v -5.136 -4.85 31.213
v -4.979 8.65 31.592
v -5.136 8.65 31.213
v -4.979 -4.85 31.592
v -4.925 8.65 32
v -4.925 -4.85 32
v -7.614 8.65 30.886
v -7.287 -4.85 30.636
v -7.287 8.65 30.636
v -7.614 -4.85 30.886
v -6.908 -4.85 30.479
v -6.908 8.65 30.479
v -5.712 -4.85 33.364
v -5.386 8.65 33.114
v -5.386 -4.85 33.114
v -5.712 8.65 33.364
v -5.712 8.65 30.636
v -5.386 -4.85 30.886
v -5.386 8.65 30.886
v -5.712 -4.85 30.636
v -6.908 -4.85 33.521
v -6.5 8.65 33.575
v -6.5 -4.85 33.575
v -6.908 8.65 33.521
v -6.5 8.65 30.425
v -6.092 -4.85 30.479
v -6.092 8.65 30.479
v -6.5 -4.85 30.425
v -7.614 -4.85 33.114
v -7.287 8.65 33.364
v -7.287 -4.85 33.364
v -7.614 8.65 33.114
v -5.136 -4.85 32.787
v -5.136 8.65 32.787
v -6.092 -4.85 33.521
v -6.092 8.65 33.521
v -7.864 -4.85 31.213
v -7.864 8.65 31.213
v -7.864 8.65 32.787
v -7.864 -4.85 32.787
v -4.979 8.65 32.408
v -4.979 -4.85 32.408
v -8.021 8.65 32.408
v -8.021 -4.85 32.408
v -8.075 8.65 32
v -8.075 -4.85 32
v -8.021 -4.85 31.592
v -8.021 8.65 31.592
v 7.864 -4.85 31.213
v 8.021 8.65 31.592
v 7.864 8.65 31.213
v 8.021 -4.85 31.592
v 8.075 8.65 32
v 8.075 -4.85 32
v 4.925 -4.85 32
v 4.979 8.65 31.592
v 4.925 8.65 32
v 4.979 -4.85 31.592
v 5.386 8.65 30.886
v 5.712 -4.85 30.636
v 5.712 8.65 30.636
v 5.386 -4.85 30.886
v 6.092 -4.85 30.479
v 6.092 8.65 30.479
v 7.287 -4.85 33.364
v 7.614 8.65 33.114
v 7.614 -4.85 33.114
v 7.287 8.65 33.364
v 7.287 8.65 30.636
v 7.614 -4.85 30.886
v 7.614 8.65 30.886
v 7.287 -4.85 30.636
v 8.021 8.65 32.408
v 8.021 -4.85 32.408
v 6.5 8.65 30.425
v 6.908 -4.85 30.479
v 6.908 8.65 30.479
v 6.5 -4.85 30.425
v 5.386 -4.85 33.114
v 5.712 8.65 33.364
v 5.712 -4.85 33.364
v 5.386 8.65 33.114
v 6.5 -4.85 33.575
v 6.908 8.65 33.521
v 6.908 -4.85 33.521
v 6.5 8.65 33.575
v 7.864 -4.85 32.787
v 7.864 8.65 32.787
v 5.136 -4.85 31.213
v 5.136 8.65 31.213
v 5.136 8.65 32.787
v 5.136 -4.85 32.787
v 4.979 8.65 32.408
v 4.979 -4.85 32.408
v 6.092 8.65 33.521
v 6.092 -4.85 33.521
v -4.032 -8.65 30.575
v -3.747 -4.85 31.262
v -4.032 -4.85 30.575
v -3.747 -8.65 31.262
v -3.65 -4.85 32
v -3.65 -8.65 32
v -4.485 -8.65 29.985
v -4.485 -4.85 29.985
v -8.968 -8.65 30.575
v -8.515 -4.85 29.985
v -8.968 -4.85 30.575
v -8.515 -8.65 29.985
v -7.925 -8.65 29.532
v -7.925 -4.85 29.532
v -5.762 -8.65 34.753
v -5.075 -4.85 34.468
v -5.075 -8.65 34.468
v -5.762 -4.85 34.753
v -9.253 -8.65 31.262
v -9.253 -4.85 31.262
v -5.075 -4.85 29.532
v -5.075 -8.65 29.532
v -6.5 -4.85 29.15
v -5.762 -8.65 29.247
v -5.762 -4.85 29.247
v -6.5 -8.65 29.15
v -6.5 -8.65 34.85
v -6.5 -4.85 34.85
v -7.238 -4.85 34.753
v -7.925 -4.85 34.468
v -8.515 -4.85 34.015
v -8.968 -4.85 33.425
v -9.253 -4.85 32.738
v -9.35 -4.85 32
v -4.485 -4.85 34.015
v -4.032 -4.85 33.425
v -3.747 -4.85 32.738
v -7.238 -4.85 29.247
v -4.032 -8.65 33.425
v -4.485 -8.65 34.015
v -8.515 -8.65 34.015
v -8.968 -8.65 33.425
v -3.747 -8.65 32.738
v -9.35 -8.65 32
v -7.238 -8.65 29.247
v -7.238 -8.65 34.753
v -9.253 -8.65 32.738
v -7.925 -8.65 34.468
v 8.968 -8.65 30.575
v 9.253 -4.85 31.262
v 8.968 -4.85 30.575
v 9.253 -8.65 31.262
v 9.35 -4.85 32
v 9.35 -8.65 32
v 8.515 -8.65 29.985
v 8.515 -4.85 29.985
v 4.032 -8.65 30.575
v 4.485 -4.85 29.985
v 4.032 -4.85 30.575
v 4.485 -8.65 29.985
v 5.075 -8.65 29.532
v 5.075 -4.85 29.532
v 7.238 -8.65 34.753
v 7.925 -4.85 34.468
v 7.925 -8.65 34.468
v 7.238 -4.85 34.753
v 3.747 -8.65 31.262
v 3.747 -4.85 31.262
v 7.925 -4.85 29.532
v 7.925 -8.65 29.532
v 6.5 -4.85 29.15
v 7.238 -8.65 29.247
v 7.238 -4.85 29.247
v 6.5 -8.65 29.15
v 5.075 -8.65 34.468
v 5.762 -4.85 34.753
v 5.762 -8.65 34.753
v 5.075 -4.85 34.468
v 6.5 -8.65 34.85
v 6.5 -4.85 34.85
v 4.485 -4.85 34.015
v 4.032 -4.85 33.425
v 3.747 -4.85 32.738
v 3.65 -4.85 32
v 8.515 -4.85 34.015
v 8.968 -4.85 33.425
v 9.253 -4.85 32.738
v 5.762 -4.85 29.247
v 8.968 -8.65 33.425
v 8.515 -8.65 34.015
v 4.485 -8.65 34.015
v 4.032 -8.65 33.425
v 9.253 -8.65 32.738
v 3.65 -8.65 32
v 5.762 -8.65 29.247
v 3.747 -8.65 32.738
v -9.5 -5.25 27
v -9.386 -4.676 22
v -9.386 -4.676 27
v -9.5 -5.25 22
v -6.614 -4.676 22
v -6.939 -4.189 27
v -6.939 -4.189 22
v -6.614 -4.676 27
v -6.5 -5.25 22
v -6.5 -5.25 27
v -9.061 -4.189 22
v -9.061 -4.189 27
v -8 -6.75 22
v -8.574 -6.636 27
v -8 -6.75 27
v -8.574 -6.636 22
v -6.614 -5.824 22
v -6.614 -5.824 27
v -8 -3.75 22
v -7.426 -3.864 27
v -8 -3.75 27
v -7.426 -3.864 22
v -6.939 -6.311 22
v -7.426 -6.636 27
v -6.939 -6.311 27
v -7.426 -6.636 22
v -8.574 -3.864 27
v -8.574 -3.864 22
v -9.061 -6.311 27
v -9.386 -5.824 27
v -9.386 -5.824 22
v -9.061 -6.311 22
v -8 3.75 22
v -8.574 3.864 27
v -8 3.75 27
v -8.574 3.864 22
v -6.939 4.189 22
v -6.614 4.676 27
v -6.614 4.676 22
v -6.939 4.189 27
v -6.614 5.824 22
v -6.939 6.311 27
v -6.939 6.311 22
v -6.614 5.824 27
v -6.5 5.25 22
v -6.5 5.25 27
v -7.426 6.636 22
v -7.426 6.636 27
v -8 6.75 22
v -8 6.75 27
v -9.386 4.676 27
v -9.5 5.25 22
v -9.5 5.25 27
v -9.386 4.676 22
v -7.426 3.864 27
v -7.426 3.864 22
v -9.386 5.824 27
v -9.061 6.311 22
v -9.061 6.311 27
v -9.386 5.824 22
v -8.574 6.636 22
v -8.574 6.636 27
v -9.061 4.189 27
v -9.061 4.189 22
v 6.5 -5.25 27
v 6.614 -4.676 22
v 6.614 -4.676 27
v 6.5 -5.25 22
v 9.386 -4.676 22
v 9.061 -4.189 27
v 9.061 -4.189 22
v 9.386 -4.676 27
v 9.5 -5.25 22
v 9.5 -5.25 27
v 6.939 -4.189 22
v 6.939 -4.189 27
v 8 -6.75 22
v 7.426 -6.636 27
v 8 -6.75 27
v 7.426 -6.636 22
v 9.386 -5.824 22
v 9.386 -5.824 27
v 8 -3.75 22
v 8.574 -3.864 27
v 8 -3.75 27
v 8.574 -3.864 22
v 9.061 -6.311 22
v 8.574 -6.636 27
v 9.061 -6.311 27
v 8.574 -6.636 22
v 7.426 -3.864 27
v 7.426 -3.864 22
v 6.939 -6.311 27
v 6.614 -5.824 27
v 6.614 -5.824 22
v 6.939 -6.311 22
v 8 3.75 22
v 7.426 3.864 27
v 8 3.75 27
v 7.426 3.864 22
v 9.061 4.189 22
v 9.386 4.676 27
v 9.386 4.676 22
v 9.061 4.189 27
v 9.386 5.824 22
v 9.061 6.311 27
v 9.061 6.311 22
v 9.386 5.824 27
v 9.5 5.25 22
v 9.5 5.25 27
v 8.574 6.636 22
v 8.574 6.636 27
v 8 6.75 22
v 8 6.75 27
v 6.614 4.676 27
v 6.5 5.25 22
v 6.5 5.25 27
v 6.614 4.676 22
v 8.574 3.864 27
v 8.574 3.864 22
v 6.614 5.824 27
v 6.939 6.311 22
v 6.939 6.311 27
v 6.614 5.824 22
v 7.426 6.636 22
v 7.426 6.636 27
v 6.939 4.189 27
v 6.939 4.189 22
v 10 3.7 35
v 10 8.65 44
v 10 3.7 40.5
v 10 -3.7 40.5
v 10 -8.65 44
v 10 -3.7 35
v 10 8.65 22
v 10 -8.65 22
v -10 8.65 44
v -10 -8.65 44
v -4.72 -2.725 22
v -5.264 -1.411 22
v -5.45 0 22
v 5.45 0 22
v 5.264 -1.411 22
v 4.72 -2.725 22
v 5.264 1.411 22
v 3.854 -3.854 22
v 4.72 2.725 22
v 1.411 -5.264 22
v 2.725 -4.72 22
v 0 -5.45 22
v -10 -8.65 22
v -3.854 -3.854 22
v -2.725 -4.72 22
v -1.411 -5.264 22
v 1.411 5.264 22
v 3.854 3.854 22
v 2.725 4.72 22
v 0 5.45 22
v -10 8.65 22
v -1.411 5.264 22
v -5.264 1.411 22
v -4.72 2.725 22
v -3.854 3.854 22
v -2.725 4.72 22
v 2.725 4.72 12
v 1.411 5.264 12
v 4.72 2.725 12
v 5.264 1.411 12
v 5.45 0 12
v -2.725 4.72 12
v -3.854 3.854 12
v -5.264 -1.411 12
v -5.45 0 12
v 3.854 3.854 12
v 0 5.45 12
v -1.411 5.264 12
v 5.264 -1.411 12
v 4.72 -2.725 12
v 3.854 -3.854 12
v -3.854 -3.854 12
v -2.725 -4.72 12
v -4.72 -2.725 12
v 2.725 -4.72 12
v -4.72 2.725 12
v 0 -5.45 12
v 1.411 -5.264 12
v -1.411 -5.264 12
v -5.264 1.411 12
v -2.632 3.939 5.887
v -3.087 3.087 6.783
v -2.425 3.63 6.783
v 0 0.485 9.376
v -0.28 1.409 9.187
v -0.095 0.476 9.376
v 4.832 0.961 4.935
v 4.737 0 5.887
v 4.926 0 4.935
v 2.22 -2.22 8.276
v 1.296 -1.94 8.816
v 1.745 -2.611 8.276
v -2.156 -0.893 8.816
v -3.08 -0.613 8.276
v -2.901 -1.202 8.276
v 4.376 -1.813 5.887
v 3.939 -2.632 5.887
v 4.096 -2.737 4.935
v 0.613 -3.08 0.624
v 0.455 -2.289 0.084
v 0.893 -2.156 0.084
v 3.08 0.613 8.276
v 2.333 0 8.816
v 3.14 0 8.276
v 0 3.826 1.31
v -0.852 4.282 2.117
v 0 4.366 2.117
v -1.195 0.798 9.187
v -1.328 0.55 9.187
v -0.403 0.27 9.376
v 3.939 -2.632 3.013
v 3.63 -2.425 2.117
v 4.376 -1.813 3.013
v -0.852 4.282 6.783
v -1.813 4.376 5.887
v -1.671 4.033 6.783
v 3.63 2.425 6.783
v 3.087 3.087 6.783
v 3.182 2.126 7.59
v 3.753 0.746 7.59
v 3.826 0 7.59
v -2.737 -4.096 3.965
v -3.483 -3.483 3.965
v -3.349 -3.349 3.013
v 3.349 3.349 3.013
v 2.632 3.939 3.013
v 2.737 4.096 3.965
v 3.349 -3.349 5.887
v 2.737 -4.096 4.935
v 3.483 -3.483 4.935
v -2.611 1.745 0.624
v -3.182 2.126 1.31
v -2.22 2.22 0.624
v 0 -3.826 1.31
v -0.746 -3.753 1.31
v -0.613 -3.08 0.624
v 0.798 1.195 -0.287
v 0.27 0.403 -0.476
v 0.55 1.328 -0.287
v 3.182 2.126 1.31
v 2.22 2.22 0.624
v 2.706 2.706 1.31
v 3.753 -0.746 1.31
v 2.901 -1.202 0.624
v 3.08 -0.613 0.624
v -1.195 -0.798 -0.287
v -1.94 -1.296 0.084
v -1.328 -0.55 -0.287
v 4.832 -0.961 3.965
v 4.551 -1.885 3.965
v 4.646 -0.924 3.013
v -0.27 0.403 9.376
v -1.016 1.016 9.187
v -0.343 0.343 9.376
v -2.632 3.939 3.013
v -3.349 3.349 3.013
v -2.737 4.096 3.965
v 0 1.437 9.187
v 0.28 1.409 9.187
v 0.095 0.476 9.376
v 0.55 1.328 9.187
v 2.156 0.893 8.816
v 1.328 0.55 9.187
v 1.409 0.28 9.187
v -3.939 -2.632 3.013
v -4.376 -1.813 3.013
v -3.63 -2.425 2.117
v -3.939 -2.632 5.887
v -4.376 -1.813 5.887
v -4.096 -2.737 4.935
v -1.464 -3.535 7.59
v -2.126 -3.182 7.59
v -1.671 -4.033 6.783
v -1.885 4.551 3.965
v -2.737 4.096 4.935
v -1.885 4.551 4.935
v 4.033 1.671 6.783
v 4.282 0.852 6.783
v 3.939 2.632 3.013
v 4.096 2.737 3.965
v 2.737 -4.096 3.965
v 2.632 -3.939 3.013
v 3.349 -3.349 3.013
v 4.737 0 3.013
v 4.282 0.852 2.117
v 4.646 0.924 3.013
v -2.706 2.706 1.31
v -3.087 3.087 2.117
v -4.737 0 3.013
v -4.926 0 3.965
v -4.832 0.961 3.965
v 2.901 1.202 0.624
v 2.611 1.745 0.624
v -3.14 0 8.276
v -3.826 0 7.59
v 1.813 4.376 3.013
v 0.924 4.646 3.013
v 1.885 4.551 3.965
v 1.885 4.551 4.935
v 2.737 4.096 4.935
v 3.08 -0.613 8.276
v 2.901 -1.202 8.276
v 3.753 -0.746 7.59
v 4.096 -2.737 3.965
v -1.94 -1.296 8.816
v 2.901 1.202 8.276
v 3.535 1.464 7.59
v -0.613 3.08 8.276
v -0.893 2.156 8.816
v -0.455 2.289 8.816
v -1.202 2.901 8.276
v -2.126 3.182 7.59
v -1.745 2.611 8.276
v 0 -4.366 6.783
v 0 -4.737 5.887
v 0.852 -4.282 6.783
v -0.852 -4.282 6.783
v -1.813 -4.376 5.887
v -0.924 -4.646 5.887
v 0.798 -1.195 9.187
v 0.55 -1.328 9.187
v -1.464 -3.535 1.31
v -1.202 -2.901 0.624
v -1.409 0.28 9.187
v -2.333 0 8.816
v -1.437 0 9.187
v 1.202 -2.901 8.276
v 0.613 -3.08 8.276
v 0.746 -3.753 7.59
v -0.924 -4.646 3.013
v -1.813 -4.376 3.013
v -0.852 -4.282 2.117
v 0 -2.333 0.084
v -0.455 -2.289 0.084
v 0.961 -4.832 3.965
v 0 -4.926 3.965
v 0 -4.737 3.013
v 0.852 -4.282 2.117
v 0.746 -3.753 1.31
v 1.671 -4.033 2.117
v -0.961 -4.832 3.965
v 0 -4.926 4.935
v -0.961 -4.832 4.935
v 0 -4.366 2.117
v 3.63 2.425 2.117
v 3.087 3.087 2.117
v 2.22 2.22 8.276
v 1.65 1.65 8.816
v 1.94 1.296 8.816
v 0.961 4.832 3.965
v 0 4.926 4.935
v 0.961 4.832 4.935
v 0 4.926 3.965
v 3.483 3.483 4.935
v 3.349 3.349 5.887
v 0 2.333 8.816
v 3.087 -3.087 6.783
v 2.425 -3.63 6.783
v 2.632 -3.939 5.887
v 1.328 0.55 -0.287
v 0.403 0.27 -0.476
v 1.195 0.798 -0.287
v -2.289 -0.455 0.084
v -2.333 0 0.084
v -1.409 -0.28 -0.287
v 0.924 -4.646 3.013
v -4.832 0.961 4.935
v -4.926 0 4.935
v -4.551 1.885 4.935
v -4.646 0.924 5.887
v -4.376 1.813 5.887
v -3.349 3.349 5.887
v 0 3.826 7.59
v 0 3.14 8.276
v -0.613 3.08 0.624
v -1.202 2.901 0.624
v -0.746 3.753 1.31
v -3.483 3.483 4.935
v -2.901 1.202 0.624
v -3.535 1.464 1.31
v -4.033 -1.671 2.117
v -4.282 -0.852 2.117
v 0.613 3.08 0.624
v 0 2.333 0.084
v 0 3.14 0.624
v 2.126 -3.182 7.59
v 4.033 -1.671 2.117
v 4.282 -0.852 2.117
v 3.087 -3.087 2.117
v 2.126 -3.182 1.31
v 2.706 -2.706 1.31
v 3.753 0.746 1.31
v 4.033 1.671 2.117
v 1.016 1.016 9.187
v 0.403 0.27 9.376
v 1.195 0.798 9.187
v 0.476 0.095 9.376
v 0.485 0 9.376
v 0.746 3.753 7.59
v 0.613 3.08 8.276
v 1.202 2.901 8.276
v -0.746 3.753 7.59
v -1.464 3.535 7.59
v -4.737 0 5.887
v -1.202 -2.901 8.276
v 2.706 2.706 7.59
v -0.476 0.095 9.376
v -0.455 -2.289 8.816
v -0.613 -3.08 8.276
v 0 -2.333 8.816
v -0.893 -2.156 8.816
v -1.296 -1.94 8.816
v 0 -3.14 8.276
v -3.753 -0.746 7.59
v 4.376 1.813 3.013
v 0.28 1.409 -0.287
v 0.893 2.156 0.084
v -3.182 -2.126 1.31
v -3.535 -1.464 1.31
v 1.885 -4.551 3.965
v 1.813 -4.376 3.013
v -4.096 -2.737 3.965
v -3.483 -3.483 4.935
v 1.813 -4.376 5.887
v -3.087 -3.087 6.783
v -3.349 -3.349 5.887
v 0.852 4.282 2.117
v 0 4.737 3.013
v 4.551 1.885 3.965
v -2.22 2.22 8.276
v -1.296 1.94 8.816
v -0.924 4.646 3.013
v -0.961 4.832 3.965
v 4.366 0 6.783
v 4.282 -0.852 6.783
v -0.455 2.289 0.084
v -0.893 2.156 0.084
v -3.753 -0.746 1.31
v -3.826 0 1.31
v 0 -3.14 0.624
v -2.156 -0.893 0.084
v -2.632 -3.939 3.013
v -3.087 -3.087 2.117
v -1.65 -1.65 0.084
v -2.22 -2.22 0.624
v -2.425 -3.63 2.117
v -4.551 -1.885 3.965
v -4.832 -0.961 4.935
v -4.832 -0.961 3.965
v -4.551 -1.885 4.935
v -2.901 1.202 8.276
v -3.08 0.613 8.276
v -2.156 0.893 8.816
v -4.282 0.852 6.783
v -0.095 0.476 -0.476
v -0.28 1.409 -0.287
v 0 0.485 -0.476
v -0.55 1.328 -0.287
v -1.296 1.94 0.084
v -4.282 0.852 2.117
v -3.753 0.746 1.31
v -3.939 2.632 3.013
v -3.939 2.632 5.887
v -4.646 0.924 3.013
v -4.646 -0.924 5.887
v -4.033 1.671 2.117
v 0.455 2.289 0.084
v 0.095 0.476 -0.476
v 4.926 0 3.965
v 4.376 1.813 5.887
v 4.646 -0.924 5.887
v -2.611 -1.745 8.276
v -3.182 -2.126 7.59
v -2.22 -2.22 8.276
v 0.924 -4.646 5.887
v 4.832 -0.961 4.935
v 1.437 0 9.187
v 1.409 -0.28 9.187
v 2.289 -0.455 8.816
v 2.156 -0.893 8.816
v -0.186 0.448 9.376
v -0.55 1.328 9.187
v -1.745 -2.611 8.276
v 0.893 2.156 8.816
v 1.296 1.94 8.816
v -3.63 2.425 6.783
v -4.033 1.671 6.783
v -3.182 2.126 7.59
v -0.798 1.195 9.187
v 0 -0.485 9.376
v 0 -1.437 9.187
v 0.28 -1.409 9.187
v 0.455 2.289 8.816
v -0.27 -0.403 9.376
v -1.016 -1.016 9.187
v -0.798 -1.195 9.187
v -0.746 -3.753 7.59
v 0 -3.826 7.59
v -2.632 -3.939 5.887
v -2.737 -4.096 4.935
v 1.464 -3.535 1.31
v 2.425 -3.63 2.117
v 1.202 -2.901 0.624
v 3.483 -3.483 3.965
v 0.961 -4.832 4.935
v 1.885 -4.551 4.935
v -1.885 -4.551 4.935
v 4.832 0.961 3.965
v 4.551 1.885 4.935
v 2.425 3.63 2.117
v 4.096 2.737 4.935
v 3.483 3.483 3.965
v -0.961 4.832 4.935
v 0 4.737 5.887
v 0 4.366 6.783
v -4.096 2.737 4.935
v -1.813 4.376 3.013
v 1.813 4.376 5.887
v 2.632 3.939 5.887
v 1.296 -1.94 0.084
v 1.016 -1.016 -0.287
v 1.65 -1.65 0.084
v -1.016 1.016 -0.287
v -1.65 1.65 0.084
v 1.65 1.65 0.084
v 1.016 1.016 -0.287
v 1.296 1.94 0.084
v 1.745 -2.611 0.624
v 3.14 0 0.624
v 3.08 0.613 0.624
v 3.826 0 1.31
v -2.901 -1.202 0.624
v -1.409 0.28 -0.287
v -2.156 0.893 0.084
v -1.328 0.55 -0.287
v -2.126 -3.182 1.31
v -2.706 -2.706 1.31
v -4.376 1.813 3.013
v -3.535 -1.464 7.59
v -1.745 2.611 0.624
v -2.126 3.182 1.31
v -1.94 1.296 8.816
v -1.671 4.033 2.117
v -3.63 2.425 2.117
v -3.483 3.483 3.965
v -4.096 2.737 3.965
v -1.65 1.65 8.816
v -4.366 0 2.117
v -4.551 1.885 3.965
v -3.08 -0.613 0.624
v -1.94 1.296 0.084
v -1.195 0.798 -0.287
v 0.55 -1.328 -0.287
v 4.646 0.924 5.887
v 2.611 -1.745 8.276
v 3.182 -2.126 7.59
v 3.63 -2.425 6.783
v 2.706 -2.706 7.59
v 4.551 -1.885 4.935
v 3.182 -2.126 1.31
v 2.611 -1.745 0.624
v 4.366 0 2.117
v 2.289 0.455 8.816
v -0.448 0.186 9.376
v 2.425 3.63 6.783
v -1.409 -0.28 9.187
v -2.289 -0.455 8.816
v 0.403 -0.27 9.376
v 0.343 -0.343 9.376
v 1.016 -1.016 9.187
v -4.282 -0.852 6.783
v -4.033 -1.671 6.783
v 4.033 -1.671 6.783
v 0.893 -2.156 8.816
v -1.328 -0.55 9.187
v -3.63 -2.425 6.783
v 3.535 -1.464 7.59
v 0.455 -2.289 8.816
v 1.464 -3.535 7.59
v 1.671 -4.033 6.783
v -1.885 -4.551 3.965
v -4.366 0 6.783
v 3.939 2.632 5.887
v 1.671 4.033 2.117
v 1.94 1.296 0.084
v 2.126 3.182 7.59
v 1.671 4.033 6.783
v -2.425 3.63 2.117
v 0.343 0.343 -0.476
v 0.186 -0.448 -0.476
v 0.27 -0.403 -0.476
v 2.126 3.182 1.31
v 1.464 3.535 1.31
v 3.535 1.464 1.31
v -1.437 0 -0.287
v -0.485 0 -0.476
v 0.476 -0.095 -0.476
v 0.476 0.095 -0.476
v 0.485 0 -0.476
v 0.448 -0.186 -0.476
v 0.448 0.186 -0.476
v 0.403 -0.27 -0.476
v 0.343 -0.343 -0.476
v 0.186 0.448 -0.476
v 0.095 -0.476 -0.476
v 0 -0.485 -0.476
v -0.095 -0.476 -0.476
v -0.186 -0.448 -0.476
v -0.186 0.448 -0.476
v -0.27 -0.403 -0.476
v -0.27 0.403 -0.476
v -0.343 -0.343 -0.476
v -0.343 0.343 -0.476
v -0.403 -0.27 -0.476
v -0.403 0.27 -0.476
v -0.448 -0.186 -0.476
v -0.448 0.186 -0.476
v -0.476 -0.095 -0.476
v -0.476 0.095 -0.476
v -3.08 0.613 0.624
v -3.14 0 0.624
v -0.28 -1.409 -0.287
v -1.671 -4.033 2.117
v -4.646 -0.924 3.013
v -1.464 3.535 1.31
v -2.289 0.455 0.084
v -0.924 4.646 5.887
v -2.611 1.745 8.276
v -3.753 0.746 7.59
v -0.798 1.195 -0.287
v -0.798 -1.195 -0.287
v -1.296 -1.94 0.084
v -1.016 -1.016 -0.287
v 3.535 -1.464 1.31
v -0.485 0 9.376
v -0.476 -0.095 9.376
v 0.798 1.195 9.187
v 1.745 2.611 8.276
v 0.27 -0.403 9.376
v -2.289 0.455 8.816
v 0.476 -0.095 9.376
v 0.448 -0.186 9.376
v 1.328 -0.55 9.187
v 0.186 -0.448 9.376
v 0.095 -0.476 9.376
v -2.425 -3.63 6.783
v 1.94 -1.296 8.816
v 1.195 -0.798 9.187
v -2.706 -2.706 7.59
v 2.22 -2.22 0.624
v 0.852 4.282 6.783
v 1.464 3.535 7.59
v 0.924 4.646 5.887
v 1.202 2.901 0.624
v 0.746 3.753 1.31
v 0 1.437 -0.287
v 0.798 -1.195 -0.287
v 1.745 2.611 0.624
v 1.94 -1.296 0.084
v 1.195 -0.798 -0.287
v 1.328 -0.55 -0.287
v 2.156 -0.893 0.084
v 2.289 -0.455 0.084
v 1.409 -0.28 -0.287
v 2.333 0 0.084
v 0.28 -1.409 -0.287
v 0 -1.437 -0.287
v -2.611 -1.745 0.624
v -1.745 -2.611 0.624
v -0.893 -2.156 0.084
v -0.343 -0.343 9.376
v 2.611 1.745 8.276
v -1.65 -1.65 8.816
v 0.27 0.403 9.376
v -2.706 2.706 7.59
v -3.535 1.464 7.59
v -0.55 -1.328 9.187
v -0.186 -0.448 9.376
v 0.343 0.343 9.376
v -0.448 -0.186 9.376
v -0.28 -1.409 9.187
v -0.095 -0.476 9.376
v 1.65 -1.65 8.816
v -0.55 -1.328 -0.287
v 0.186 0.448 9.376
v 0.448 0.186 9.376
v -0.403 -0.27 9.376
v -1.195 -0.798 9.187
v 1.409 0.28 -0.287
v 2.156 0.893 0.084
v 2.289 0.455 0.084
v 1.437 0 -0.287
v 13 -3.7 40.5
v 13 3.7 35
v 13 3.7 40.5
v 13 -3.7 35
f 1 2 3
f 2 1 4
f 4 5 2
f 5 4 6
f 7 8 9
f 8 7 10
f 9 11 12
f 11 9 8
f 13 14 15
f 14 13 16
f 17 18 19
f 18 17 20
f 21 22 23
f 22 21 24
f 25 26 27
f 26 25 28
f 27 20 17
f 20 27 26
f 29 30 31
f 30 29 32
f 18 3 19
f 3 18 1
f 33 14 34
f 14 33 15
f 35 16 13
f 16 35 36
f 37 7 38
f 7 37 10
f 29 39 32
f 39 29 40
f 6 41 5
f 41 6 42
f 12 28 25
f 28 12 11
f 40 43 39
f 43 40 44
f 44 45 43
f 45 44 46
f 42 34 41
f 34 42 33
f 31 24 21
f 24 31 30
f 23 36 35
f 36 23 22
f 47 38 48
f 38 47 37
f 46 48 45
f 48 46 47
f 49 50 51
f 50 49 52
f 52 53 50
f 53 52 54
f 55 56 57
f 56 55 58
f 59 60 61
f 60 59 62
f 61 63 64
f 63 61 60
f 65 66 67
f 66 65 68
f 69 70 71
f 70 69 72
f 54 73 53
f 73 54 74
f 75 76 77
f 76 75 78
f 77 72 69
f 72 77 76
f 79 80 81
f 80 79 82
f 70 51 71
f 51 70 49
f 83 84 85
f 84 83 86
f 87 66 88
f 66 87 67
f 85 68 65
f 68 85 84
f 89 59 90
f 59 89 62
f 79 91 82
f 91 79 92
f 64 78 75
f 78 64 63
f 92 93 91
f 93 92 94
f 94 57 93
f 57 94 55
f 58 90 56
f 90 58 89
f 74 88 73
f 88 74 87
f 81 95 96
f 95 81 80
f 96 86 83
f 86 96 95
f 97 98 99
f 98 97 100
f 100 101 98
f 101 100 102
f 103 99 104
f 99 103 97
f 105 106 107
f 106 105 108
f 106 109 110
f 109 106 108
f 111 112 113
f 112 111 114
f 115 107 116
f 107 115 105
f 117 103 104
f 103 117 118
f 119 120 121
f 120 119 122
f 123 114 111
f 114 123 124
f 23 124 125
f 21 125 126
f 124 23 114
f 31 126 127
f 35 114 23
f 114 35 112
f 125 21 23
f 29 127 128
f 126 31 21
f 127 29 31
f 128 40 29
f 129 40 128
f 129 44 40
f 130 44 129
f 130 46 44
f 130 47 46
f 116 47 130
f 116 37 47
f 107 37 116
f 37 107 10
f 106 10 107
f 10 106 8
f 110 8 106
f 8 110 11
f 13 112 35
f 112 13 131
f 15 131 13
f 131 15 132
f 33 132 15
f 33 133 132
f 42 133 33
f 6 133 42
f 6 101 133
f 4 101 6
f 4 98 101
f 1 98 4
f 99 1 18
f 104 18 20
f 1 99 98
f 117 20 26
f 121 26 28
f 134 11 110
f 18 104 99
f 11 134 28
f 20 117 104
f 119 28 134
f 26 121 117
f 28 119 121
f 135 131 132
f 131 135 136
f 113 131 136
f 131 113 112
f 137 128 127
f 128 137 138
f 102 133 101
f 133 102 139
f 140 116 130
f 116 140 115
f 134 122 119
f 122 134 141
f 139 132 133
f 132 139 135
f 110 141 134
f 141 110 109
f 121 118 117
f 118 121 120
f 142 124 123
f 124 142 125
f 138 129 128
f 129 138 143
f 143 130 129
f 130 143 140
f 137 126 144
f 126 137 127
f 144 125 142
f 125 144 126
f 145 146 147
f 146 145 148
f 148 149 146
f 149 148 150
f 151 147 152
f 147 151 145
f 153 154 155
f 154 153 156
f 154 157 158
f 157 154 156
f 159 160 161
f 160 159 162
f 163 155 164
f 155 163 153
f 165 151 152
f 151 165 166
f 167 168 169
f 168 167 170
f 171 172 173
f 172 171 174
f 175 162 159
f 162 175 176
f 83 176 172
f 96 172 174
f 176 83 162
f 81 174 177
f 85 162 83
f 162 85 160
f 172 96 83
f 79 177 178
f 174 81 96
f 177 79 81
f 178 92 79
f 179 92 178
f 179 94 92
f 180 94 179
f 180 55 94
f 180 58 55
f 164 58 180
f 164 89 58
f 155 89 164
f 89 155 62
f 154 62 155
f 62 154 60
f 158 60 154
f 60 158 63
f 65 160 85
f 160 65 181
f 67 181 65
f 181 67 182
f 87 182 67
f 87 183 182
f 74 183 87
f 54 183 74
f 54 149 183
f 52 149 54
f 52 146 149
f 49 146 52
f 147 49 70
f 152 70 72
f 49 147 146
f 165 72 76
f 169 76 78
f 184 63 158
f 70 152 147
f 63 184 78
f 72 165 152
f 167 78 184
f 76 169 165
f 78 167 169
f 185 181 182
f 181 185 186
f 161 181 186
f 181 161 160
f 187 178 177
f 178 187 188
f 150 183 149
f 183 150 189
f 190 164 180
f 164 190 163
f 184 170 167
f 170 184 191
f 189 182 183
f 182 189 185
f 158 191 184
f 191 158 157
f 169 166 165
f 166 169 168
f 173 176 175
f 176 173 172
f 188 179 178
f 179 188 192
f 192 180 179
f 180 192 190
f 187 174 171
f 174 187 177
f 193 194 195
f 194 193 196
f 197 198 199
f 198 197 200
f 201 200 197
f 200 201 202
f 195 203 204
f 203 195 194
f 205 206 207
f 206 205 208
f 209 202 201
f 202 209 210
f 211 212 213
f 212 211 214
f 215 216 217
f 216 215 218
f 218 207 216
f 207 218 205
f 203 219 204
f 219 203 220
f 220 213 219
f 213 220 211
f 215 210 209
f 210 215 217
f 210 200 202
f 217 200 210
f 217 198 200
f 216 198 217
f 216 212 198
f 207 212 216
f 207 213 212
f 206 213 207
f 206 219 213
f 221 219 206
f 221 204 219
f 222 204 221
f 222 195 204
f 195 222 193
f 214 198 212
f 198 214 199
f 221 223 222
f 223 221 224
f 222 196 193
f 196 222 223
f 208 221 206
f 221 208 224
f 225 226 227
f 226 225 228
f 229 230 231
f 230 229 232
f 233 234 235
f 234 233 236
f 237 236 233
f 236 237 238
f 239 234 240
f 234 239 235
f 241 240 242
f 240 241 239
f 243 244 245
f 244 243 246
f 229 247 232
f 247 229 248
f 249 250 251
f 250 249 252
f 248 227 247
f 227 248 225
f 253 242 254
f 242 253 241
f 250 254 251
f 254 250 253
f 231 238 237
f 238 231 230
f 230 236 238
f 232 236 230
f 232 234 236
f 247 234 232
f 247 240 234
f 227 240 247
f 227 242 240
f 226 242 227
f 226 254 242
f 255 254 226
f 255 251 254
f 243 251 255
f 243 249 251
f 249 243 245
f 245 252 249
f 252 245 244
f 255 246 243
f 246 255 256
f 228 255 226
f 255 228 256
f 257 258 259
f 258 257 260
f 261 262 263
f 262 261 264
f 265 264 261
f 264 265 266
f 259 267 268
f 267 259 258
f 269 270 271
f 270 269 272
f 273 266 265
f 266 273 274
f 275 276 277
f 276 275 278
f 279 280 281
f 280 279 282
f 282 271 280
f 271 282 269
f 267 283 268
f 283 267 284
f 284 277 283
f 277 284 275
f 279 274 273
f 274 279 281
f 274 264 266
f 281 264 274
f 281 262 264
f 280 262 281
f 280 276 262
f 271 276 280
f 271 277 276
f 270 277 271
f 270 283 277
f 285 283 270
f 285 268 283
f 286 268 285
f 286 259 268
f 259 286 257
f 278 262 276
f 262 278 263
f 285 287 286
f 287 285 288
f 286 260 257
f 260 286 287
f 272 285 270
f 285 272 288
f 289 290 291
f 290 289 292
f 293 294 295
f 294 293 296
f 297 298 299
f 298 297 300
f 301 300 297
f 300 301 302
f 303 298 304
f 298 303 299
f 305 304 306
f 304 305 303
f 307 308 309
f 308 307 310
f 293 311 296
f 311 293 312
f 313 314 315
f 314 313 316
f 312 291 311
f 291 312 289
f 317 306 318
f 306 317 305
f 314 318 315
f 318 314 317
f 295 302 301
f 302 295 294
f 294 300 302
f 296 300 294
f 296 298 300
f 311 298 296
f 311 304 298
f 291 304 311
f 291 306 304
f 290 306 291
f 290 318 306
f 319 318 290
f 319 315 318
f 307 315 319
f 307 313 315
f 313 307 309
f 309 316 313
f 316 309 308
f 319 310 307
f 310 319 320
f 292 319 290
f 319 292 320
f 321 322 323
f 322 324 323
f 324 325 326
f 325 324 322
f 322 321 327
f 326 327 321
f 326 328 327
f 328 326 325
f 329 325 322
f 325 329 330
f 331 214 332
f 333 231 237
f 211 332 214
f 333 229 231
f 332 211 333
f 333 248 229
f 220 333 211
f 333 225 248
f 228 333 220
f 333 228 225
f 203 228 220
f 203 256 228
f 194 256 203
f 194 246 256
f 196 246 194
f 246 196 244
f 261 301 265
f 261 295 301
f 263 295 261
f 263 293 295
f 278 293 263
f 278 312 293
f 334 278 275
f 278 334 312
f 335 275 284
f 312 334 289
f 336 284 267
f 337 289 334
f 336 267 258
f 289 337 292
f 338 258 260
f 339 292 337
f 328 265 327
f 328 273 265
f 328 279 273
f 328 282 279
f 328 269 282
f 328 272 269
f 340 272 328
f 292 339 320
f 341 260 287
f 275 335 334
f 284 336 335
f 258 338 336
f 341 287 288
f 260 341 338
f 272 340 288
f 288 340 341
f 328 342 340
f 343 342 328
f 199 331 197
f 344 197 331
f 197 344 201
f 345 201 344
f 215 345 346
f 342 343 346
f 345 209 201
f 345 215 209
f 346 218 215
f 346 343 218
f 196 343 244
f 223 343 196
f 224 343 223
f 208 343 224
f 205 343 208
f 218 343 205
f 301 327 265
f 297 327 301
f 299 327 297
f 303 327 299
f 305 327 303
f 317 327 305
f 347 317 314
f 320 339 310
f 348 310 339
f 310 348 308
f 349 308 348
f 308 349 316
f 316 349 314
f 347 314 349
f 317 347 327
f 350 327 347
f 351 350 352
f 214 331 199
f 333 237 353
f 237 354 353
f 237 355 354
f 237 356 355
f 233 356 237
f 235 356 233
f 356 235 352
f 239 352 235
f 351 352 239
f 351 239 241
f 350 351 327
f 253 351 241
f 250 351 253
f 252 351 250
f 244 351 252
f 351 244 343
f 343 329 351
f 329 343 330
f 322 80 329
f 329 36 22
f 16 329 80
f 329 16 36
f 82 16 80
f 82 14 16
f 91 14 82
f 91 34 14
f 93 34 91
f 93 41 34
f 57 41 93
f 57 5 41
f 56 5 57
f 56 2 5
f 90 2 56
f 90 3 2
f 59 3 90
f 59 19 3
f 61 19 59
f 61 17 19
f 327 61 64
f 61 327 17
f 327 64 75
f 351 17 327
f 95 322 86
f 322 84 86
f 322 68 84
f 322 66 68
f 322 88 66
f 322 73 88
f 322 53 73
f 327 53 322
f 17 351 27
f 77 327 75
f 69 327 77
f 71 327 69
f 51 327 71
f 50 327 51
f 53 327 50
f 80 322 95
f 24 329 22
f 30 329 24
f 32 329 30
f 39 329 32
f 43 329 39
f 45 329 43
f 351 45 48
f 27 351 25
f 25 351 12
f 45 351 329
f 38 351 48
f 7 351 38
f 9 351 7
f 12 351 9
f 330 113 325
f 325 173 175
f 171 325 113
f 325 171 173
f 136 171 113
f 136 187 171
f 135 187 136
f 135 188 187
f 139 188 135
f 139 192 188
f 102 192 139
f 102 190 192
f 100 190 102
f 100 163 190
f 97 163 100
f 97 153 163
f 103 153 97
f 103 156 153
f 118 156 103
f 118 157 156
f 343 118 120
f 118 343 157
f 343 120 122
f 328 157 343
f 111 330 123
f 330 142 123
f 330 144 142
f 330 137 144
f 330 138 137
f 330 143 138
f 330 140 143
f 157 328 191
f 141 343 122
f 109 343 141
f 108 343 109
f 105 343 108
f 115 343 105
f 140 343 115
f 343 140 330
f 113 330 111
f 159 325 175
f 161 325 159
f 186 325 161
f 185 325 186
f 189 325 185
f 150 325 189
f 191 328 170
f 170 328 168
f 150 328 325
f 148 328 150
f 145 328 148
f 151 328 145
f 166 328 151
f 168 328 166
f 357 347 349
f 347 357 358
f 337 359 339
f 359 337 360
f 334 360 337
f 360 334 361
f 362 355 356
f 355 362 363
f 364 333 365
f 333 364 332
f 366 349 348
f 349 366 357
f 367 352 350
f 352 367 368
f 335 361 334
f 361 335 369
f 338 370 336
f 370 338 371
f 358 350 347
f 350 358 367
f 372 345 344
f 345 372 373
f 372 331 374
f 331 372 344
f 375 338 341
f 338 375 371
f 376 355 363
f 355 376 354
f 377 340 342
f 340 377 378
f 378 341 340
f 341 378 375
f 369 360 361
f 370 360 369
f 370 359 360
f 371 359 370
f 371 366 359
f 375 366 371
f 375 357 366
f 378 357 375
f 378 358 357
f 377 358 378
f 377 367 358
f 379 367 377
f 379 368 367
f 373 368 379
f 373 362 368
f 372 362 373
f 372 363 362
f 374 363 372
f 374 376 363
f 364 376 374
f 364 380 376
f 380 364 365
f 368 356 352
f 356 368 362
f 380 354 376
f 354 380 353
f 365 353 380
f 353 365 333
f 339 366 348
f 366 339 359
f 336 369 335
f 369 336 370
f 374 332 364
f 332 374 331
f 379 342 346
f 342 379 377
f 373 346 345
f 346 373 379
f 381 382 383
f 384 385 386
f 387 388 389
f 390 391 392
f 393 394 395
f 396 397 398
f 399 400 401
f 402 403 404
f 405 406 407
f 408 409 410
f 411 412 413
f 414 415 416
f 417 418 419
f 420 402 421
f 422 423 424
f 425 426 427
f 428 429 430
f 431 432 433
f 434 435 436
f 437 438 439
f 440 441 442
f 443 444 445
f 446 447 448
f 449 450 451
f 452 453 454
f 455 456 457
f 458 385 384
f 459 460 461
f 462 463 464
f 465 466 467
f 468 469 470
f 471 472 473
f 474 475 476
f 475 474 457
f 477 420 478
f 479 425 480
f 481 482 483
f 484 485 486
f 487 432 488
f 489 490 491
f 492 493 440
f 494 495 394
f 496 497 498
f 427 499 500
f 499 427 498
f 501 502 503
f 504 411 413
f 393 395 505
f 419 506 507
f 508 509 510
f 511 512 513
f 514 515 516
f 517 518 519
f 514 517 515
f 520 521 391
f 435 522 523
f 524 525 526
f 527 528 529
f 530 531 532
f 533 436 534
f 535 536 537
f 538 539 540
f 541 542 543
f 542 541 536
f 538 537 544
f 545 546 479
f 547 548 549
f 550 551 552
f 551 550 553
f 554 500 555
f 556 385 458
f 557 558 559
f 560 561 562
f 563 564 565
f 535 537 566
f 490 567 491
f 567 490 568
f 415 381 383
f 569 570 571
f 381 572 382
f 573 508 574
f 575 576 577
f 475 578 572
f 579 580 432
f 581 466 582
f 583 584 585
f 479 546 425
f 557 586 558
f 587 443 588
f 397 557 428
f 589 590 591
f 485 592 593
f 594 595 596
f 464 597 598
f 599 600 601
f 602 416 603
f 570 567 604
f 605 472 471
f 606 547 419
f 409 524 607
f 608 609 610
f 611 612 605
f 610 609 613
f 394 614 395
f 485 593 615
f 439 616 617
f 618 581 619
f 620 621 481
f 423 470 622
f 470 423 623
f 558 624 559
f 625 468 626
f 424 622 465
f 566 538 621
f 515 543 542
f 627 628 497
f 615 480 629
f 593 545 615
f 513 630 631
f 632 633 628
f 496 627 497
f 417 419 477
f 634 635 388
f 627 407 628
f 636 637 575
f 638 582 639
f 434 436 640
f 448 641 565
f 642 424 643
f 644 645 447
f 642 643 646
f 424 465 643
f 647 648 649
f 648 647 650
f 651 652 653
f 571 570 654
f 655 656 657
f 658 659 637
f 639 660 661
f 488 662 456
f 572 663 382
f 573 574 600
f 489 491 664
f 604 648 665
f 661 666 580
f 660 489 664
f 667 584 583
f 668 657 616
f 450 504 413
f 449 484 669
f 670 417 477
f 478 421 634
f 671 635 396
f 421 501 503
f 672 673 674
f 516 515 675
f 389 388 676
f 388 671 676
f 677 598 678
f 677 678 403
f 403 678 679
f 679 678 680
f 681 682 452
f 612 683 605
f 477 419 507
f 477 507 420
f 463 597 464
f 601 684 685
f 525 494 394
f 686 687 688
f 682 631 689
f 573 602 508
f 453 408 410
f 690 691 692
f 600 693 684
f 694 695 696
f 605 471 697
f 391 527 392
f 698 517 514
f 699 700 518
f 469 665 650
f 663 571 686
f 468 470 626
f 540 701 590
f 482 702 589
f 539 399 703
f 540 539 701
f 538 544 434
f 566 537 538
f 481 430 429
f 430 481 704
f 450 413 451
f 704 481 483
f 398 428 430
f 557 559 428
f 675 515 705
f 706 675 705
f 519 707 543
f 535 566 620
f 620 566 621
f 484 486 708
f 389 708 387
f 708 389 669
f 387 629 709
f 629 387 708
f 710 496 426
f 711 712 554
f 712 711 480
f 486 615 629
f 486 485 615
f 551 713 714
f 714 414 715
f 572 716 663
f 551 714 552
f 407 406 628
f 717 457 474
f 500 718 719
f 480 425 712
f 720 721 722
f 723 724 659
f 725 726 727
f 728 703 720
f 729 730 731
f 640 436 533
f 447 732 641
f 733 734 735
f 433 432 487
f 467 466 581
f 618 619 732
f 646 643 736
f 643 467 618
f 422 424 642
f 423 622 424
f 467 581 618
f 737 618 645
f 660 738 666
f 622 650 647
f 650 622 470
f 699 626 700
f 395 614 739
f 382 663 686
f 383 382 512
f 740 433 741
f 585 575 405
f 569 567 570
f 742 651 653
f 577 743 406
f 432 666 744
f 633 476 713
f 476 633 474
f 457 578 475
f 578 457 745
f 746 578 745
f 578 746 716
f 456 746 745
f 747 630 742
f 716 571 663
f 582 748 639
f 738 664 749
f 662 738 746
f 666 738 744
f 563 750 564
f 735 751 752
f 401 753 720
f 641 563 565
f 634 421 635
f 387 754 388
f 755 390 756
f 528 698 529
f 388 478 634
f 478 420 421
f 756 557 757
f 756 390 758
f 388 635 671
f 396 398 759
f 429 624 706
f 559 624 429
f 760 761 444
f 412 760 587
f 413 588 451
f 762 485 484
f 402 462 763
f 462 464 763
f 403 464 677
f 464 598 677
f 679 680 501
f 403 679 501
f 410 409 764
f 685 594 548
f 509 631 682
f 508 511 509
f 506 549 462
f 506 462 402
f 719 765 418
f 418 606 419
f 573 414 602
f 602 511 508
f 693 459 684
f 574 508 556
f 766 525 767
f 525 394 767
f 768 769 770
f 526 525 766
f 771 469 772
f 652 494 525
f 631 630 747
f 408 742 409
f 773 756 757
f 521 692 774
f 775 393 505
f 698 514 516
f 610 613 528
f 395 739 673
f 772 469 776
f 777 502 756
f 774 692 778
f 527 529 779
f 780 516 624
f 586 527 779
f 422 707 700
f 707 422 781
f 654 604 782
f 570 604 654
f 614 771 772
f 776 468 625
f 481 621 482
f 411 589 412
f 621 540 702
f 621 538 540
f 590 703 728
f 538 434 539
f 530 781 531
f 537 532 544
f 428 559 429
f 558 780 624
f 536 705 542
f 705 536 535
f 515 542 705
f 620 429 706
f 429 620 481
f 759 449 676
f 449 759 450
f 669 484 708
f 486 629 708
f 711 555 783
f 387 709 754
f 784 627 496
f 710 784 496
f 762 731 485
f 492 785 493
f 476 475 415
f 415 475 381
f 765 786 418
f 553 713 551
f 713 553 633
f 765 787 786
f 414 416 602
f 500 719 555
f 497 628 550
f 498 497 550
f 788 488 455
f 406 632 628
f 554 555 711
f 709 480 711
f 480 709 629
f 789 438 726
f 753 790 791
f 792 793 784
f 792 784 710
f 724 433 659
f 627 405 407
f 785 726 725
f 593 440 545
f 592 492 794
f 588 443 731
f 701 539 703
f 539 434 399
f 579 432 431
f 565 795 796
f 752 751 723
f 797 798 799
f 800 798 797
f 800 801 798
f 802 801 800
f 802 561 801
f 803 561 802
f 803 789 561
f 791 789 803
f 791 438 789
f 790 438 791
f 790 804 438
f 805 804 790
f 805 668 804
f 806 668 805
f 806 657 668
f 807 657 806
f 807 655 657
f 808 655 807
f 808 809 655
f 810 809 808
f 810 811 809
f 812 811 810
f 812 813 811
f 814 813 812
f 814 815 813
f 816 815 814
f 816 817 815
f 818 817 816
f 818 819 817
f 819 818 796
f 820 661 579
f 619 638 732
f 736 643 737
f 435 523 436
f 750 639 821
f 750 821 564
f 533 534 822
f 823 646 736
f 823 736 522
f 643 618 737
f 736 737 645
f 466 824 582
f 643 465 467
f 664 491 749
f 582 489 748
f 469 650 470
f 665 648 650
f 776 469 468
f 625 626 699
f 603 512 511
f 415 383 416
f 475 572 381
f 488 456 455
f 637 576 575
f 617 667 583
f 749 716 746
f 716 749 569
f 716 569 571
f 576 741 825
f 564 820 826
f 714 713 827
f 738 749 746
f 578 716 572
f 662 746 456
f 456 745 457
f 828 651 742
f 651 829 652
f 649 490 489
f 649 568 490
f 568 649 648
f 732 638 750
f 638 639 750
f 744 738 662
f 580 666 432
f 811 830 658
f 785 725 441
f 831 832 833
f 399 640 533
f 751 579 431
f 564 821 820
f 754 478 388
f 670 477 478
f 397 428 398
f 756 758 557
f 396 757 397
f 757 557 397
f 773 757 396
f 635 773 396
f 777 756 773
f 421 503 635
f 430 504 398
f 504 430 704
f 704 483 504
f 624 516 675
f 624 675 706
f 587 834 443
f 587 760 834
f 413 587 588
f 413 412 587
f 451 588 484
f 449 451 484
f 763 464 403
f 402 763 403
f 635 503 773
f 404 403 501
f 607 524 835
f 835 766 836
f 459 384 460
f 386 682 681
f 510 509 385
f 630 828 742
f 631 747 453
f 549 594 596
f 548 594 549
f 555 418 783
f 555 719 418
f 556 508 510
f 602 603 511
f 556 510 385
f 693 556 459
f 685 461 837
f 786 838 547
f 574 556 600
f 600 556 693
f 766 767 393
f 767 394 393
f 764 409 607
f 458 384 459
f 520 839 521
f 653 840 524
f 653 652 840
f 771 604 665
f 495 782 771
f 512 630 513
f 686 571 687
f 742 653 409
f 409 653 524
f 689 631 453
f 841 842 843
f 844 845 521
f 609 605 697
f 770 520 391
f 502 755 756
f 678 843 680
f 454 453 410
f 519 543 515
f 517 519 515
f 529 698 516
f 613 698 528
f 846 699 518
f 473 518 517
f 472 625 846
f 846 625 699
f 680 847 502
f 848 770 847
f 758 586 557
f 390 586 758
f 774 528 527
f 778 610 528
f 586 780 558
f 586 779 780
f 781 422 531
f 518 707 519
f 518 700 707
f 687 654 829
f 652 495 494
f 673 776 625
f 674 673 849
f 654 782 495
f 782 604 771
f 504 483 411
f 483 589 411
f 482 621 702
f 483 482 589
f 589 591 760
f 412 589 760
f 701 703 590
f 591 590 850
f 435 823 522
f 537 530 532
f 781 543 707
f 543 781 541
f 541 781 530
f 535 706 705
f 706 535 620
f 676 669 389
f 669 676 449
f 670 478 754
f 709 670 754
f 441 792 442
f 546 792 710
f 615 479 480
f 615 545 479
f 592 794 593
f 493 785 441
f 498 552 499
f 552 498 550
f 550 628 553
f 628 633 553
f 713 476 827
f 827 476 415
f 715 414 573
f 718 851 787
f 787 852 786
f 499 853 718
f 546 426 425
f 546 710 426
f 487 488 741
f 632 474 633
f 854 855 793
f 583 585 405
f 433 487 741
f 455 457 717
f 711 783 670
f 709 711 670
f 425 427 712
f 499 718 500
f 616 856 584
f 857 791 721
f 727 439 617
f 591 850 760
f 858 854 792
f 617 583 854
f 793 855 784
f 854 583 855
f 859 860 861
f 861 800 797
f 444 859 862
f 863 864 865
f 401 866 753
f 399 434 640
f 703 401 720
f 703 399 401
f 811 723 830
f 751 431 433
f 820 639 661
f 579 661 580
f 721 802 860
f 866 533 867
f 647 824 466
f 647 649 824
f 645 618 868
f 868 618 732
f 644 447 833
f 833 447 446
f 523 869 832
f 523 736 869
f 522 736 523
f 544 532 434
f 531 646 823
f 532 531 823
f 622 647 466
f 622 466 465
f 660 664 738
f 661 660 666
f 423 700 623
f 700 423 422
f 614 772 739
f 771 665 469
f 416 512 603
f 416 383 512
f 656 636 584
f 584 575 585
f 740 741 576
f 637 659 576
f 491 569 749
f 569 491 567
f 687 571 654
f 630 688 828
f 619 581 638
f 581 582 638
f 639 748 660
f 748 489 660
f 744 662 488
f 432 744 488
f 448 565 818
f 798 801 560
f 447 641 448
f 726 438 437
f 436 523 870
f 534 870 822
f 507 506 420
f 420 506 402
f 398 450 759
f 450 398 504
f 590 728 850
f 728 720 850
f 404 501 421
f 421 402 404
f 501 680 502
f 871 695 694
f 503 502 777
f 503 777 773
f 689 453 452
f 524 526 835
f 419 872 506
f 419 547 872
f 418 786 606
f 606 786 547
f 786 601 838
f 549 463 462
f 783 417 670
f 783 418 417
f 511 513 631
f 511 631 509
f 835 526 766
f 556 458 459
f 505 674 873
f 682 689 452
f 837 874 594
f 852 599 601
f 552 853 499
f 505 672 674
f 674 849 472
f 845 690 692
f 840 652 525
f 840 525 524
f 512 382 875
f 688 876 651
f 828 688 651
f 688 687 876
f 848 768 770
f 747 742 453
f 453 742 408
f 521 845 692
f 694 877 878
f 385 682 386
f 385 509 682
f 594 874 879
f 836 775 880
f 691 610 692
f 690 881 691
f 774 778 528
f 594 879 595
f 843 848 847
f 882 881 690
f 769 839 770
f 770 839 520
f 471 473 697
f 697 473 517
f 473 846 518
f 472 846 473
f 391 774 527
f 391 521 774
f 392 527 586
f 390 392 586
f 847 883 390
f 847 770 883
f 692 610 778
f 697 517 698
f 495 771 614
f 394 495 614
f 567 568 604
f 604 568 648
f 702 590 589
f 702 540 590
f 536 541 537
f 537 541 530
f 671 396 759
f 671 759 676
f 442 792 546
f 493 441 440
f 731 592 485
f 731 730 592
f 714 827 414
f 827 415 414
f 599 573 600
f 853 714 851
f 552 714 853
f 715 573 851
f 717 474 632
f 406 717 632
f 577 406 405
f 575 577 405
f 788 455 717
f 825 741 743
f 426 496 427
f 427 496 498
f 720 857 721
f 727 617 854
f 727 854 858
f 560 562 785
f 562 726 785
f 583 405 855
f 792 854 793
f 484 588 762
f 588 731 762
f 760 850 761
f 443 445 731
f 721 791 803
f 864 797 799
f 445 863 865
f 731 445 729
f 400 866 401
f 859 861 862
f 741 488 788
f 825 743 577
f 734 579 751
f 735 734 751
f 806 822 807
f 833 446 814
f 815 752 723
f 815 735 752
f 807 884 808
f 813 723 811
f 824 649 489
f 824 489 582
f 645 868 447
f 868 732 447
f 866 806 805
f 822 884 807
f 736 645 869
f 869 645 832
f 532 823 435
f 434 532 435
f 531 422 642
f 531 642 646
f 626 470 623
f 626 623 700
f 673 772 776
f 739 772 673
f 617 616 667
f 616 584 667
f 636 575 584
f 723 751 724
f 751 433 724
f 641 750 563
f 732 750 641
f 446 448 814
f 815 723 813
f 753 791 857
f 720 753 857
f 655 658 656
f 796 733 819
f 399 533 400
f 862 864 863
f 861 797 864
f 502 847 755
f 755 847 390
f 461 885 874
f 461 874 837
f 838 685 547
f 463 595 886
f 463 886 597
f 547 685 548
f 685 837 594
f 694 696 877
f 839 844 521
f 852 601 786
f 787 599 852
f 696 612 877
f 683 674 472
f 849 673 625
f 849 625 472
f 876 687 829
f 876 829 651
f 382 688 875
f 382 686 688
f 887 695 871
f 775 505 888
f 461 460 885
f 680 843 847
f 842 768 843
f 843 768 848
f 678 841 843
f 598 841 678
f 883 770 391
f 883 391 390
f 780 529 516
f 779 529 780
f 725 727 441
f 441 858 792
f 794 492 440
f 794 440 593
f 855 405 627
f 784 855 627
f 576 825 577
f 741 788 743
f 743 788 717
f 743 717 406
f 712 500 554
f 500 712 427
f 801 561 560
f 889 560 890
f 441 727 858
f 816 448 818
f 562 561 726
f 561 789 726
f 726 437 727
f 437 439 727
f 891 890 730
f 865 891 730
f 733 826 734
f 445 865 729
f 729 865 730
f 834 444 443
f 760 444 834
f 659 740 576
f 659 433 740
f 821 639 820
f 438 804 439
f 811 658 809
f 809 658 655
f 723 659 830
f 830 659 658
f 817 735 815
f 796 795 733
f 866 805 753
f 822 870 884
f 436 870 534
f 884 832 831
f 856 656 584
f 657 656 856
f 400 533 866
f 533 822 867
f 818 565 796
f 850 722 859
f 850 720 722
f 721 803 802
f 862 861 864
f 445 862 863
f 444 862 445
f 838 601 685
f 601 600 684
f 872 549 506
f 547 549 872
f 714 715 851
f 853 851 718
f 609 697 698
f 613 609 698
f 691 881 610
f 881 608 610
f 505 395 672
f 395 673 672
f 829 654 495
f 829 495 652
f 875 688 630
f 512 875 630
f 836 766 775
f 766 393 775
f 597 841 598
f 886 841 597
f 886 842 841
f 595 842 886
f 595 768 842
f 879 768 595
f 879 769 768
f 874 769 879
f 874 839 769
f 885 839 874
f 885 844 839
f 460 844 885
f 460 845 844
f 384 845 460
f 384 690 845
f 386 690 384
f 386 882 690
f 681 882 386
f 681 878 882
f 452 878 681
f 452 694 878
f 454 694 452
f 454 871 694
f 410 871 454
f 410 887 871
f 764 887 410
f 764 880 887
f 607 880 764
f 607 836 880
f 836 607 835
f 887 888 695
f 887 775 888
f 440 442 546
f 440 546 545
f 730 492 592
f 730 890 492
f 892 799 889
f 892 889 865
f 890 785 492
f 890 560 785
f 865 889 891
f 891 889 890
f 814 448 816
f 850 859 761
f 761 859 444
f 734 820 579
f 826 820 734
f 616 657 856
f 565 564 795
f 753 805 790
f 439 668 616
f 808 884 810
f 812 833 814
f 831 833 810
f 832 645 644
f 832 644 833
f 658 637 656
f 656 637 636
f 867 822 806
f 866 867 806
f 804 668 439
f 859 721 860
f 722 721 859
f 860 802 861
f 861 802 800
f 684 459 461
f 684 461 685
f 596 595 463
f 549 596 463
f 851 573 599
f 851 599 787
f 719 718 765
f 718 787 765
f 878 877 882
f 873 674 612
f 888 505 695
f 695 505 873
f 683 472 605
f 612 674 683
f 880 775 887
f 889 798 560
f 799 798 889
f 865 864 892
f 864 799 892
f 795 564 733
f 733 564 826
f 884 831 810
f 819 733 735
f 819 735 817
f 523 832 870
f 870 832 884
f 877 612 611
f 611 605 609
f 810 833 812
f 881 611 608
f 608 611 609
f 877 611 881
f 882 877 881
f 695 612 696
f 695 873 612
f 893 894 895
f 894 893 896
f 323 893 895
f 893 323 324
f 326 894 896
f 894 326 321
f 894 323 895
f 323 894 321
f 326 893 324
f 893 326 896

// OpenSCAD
// mock up of mellow multuhead zero tool, which seems to be
// a well machined plunger activating a common microswitch. 
// It may be a very cost effective solution for calibration probing
// a plate with fiducials.  Constrained Z-only motion may give
// more reliable readings when contact is slightly off-center

// seems to trigger about .5mm up from resting position

mellowMultiheadZero();

module mellowMultiheadZero() {
    translate([0,0,9.9/2-.5]) sphere(d=9.9,$fn=32);
    translate([0,0,12]) {
        cylinder(d=10.9,h=15,$fn=24);
        difference() {
            translate([0,0,10+22/2]) cube([20,17.3,22],center=true);
            #translate([0,0,10+10]) rotate([-90,0,0]) pairX(13/2)
                cylinder(d=3.15,h=40,center=true,$fn=24);
            translate([0,-17.3/2-.1,10+10]) rotate([-90,0,0]) pairX(13/2)
                cylinder(d=5.7,h=3.9,$fn=24);
            #pairX(16/2) pairY(10.5/2) cylinder(d=3,h=5+10,$fn=16);
        }
    }
    translate([11.5,0,41.25-3.5]) cube([3,7.4,5.5],center=true);
    
}

module pairX(d) for(a=[-d,d]) translate([a,0,0]) children();
module pairY(d) for(a=[-d,d]) translate([0,a,0]) children();
